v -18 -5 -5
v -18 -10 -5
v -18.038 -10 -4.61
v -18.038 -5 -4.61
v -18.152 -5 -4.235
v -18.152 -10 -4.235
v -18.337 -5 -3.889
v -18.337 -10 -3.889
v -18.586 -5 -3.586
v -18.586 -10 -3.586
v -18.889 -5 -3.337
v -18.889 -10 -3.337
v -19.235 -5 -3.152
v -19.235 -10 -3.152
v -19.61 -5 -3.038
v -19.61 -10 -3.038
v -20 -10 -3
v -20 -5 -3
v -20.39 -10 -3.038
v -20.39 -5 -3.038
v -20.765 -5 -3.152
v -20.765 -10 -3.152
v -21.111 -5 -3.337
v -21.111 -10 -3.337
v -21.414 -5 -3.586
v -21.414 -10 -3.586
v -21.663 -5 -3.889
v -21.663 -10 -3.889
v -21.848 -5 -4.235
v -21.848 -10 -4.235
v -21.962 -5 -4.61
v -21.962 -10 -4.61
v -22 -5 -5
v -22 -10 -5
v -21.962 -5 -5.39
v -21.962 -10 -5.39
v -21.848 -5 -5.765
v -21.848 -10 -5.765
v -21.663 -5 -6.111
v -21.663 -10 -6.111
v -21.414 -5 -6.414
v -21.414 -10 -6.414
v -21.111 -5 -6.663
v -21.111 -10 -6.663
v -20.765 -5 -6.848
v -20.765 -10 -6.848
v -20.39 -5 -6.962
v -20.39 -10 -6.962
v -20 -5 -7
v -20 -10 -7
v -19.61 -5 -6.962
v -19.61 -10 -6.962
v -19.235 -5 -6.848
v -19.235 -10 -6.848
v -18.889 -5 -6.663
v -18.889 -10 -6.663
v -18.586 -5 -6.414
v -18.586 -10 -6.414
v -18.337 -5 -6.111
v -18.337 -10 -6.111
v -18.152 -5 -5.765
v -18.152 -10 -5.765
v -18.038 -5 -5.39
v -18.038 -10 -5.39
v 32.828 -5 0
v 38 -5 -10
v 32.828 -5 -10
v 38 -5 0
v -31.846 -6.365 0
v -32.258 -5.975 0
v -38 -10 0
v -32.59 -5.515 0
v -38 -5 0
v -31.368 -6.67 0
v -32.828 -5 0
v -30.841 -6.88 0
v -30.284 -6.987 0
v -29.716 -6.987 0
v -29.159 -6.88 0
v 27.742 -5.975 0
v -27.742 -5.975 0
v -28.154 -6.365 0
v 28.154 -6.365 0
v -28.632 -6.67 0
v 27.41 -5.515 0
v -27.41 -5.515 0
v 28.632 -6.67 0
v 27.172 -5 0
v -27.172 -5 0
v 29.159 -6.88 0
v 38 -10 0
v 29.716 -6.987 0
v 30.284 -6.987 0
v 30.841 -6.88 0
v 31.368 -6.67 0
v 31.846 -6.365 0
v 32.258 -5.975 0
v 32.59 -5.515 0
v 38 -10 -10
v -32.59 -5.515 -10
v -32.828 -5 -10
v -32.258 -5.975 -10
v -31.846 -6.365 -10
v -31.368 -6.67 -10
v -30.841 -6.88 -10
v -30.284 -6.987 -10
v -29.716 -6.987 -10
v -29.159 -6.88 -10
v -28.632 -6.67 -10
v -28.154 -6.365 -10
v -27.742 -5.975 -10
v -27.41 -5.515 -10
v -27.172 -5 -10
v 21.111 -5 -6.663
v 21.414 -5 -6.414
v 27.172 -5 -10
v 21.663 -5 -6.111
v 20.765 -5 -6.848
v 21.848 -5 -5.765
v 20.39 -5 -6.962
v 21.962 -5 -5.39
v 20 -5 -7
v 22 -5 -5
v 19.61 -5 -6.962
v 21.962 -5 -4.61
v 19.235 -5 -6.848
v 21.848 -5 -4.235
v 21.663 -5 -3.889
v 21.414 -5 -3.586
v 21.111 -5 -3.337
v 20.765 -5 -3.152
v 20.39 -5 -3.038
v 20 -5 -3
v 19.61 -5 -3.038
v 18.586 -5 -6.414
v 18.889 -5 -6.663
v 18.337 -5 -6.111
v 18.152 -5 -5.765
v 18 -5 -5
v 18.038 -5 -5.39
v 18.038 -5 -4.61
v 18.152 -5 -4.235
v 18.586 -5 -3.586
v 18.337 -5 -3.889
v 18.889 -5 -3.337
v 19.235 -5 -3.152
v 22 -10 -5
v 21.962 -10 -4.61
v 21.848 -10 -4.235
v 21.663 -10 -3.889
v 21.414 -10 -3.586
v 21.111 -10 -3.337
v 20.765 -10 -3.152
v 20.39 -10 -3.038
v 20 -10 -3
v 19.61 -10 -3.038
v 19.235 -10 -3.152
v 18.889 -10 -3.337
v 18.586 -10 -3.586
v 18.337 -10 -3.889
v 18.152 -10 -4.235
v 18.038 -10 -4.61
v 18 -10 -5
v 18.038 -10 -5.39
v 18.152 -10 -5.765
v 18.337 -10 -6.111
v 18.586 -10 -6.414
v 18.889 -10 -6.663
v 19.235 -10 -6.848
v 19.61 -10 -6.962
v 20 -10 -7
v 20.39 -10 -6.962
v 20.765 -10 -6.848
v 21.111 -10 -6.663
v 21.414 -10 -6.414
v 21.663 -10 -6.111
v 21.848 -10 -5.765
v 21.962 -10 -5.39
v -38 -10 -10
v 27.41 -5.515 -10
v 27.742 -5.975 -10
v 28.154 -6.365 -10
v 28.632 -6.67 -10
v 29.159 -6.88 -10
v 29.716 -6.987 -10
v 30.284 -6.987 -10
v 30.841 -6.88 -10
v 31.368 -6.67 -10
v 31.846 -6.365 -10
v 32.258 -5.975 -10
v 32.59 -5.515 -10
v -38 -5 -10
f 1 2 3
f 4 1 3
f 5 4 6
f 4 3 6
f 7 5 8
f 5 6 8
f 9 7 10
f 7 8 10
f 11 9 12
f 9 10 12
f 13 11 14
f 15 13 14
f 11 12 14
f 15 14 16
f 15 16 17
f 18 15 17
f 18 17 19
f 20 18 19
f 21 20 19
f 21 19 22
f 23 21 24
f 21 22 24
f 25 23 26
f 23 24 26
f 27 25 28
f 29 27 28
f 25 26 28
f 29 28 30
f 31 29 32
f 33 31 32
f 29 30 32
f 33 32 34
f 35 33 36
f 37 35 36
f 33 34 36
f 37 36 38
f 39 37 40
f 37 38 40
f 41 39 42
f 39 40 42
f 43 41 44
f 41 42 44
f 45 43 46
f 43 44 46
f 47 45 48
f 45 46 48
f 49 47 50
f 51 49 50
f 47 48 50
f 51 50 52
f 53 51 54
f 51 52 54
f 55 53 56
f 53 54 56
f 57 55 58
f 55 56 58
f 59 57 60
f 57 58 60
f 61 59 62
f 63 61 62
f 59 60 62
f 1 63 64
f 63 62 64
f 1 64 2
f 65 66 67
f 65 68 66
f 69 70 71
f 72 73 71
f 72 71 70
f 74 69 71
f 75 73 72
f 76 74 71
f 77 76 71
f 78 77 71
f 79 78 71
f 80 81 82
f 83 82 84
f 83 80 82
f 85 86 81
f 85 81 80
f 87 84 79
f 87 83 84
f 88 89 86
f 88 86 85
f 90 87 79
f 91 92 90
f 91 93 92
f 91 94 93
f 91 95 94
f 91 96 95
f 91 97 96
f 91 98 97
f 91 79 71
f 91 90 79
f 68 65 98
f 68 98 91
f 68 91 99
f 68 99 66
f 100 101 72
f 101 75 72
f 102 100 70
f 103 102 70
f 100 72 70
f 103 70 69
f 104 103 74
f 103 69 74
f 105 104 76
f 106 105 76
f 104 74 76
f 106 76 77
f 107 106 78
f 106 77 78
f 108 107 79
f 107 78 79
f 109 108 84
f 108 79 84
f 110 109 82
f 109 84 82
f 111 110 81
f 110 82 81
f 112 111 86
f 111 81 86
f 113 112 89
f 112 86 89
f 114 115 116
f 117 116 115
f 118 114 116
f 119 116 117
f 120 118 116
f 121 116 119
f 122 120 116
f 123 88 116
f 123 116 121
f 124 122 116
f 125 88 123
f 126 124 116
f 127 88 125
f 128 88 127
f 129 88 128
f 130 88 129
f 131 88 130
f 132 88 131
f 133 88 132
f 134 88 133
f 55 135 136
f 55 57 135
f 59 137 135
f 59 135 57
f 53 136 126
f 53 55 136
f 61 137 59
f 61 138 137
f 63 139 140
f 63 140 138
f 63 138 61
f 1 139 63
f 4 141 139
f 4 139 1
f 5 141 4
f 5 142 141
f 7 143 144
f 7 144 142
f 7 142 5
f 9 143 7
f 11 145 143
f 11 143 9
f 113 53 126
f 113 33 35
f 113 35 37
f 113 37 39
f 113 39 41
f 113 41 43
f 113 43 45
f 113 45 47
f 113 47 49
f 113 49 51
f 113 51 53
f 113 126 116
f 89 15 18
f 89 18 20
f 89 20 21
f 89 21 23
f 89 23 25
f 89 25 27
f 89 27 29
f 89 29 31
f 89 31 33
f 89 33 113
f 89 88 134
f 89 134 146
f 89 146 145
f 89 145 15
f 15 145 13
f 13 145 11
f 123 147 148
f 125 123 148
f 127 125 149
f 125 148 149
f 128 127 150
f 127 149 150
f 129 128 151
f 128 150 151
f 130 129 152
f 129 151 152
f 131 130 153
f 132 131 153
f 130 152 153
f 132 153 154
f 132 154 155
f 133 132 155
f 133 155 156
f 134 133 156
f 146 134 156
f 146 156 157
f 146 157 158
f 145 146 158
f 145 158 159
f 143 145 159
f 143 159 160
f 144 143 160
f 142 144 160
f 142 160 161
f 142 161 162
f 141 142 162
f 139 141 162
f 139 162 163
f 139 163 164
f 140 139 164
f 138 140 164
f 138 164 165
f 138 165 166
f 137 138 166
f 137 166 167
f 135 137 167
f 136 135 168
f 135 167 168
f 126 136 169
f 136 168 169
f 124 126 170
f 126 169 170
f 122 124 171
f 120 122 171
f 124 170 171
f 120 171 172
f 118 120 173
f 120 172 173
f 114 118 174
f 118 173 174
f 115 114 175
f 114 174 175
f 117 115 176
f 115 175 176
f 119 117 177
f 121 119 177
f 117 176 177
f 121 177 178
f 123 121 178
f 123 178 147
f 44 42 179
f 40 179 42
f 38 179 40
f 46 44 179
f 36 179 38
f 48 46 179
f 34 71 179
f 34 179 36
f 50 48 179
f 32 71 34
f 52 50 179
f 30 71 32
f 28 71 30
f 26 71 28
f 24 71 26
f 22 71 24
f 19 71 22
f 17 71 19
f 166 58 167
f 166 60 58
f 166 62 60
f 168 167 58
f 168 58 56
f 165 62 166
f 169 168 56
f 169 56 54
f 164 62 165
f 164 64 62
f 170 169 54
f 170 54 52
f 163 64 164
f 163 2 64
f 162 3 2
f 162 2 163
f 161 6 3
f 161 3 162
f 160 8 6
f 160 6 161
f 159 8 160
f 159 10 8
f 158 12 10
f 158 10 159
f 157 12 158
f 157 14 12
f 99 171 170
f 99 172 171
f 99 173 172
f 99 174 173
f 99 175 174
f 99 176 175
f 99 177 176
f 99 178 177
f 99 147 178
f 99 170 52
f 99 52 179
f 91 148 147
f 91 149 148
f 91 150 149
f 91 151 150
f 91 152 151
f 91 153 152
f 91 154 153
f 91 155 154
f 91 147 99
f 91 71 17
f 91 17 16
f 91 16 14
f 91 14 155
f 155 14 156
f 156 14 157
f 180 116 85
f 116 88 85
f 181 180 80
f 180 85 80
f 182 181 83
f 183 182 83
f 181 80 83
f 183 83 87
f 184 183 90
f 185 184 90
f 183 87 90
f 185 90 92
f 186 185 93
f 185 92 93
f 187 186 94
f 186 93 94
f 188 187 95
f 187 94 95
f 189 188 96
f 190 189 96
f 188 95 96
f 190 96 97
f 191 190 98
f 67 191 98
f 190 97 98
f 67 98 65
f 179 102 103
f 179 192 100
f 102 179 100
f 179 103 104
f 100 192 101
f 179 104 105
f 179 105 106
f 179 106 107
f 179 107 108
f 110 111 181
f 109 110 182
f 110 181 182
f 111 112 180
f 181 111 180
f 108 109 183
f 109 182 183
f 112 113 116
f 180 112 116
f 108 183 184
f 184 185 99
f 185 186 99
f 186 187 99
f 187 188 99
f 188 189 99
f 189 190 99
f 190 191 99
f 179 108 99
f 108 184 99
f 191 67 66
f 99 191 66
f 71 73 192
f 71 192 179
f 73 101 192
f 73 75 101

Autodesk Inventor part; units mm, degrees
ref_plane "YZ Plane" through (0, 0, 0) normal (1, 0, 0) x (0, 1, 0)
ref_plane "XZ Plane" through (0, 0, 0) normal (0, 1, 0) x (-1, 0, 0)
sketch "Szkic1" plane through (0, 0, 0) normal (0, 0, 1) x (1, 0, 0)
  arc A0 (33, -4) -> (27, -4) centre (30, -4) ccw projected
  arc A1 (-27, -4) -> (-33, -4) centre (-30, -4) ccw projected
  circle A2 centre (30, -4) radius 3 construction
  circle A3 centre (-30, -4) radius 3 construction
  line L0 (-38, -5) -> (-38, -10)
  line L1 (-38, -10) -> (38, -10)
  line L2 (38, -10) -> (38, -5)
  line L3 (-38, 2) -> (-38, -4) construction
  line L4 (38, -4) -> (38, 2) construction
  arc A4 (27.1716, -5) -> (32.8284, -5) centre (30, -4) ccw
  arc A5 (-32.8284, -5) -> (-27.1716, -5) centre (-30, -4) ccw
  line L5 (-32.8284, -5) -> (-38, -5)
  line L6 (38, -5) -> (32.8284, -5)
  line L7 (27.1716, -5) -> (-27.1716, -5)
  point P0 (0, 0)
  dimension "d1" = 5
ref_plane "Płaszczyzna konstrukcyjna1" through (-38, -4, -10) normal (0, 0, -1) x (0, 1, 0)
extrude "Wyciągnięcie proste1" add sketch "Szkic1" against normal up to surface (10 mm away)
sketch "Szkic2" plane through (-38, -10, 0) normal (0, -1, 0) x (1, 0, 0)
  circle A0 centre (58, -5) radius 1.75 projected
  circle A1 centre (18, -5) radius 1.75 projected
  circle A2 centre (58, -5) radius 2
  circle A3 centre (18, -5) radius 2
  point P0 (38, 0)
  dimension "d4" = 4
  dimension "d5" = 4
extrude "Wyciągnięcie proste2" cut sketch "Szkic2" against normal up to next contours A0 | A1 | A2 | A3
properties part number "6_2xclamp_back"
